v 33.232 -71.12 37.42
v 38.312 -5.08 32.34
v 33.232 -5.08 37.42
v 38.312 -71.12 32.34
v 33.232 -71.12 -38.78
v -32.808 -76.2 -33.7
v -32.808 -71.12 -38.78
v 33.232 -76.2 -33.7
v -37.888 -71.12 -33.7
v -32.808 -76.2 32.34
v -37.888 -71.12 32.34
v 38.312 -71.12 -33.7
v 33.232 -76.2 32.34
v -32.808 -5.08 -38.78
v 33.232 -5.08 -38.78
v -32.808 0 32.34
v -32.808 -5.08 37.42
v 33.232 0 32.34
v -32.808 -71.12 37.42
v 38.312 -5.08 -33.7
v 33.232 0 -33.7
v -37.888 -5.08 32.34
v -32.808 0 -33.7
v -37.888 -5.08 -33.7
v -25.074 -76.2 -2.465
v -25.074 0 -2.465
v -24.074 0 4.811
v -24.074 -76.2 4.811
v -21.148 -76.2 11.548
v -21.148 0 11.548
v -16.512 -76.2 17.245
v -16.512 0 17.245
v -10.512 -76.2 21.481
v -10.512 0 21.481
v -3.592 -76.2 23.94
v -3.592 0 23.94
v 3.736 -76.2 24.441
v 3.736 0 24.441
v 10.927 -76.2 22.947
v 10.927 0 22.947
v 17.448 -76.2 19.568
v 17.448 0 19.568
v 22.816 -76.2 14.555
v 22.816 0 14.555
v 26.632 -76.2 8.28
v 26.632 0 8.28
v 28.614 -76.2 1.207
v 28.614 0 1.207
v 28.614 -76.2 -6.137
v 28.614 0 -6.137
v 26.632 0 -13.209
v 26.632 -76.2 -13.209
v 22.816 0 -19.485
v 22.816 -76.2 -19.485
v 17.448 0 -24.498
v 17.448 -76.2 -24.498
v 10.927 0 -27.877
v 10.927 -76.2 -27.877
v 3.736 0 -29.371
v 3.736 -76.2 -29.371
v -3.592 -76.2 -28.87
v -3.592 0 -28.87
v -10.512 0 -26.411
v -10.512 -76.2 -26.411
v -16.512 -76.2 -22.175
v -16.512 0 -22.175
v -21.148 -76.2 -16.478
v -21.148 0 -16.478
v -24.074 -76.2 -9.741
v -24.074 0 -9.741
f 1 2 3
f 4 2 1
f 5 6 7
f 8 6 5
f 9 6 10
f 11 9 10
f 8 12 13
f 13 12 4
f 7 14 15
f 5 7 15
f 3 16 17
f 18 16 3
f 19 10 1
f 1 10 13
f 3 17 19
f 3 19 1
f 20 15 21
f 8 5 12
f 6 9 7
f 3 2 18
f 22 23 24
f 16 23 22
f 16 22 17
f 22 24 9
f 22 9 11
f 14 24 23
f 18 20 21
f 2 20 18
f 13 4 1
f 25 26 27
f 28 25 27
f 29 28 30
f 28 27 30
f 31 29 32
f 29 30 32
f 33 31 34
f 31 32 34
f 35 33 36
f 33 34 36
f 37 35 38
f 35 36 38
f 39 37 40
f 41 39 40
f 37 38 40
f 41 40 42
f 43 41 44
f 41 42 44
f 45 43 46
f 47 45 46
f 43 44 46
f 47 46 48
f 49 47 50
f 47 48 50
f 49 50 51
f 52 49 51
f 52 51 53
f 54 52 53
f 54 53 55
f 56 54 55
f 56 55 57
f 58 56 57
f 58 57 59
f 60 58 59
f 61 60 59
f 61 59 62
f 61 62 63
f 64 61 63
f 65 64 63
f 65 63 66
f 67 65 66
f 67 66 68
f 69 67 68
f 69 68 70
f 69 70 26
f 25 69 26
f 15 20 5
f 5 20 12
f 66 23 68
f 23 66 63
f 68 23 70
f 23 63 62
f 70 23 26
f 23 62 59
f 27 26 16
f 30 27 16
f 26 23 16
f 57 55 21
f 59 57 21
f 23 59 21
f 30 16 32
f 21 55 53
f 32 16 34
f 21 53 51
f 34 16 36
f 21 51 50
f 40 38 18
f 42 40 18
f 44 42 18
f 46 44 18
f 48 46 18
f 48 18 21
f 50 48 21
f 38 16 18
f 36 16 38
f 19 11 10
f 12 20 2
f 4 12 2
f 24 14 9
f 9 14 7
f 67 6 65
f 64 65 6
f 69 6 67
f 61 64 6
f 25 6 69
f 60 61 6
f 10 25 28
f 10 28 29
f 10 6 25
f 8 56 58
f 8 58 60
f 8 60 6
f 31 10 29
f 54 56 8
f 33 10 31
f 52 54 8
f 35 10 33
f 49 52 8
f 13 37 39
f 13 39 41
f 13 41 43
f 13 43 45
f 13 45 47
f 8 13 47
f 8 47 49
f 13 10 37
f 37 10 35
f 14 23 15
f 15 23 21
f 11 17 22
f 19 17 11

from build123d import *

# Parameters (mm, degrees)
F0_W     = 76.2
F0_H     = 76.2
F1_DEPTH = 76.2
F2_R     = 26.969245
F3_DEPTH = 76.201
F4_SIZE  = 5.08


with BuildPart() as f1:
    # F0 (on Front) → F1 (new body)
    with BuildSketch(Plane.XZ):
        with Locations((0.212106, -0.679574)):
            Rectangle(F0_W, F0_H)
    extrude(amount=F1_DEPTH)

    # F2 (on face) → F3 (cut, through all)
    with BuildSketch(Plane(origin=(0, 0, 0), x_dir=(-1, 0, 0), z_dir=(0, 1, 0))):
        with Locations((-1.895509, -2.46492)):
            Circle(F2_R)
    extrude(amount=-F3_DEPTH, mode=Mode.SUBTRACT)

    # F4
    f4_edges = [f1.edges().sort_by_distance(p)[0] for p in [
        (-37.887894, -38.1, 37.420426),
        (-37.887894, -38.1, -38.779574),
        (-37.887894, 0, -0.679574),
        (-37.887894, -76.2, -0.679574),
        (38.312106, -38.1, -38.779574),
        (0.212106, 0, -38.779574),
        (0.212106, -76.2, -38.779574),
        (38.312106, -38.1, 37.420426),
        (38.312106, 0, -0.679574),
        (38.312106, -76.2, -0.679574),
        (0.212106, 0, 37.420426),
        (0.212106, -76.2, 37.420426),
    ]]
    chamfer(f4_edges, length=F4_SIZE)


solid = f1.part
